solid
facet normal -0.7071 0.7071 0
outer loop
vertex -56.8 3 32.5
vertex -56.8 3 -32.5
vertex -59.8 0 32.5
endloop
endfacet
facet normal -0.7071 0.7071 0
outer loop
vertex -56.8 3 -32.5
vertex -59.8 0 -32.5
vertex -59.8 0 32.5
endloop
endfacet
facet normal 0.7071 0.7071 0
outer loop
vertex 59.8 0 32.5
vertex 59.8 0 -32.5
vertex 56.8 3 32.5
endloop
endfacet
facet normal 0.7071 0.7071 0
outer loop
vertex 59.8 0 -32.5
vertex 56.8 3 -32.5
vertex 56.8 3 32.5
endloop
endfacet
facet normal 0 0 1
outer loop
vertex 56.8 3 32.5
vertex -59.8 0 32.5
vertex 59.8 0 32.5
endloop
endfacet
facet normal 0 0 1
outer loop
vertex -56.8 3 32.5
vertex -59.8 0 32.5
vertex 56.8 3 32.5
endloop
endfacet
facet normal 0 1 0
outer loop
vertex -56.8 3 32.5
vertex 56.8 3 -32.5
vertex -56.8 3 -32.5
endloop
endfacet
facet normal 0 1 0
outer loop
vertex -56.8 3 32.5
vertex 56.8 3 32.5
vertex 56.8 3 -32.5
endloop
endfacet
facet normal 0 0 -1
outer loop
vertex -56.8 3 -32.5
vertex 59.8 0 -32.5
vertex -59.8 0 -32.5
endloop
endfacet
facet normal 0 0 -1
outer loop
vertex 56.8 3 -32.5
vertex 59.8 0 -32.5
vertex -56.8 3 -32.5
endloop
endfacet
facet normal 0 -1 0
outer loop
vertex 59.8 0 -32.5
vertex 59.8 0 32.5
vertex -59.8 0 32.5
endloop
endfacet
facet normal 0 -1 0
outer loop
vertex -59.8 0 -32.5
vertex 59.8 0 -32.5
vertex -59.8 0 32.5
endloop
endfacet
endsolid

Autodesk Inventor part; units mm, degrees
ref_plane "YZ Plane" through (0, 0, 0) normal (1, 0, 0) x (0, 1, 0)
ref_plane "XZ Plane" through (0, 0, 0) normal (0, 1, 0) x (-1, 0, 0)
ref_plane "XY Plane" through (0, 0, 0) normal (0, 0, 1) x (1, 0, 0)
sketch "Sketch1" plane through (0, 0, 0) normal (0, 1, 0) x (-1, 0, 0)
  line L0 (59.8, 32.5) -> (-59.8, 32.5)
  line L1 (-59.8, 32.5) -> (-59.8, -32.5)
  line L2 (-59.8, -32.5) -> (59.8, -32.5)
  line L3 (59.8, -32.5) -> (59.8, 32.5)
  line L4 (59.8, 32.5) -> (-59.8, -32.5) construction
  line L5 (-59.8, 32.5) -> (59.8, -32.5) construction
  point P0 (0, 0)
  dimension "d0" = 119.6
  dimension "d1" = 65
extrude "Extrusion1" add sketch "Sketch1" along normal blind 3
chamfer "Chamfer1" distance 3 angle 45 1 edges at (59.8, 3, 0) measured on face at (59.8, 1, 10.8333)
chamfer "Chamfer2" distance 3 angle 45 1 edges at (-59.8, 3, 0) measured on face at (-59.8, 1, -10.8333)
properties part number "Left Wall"
